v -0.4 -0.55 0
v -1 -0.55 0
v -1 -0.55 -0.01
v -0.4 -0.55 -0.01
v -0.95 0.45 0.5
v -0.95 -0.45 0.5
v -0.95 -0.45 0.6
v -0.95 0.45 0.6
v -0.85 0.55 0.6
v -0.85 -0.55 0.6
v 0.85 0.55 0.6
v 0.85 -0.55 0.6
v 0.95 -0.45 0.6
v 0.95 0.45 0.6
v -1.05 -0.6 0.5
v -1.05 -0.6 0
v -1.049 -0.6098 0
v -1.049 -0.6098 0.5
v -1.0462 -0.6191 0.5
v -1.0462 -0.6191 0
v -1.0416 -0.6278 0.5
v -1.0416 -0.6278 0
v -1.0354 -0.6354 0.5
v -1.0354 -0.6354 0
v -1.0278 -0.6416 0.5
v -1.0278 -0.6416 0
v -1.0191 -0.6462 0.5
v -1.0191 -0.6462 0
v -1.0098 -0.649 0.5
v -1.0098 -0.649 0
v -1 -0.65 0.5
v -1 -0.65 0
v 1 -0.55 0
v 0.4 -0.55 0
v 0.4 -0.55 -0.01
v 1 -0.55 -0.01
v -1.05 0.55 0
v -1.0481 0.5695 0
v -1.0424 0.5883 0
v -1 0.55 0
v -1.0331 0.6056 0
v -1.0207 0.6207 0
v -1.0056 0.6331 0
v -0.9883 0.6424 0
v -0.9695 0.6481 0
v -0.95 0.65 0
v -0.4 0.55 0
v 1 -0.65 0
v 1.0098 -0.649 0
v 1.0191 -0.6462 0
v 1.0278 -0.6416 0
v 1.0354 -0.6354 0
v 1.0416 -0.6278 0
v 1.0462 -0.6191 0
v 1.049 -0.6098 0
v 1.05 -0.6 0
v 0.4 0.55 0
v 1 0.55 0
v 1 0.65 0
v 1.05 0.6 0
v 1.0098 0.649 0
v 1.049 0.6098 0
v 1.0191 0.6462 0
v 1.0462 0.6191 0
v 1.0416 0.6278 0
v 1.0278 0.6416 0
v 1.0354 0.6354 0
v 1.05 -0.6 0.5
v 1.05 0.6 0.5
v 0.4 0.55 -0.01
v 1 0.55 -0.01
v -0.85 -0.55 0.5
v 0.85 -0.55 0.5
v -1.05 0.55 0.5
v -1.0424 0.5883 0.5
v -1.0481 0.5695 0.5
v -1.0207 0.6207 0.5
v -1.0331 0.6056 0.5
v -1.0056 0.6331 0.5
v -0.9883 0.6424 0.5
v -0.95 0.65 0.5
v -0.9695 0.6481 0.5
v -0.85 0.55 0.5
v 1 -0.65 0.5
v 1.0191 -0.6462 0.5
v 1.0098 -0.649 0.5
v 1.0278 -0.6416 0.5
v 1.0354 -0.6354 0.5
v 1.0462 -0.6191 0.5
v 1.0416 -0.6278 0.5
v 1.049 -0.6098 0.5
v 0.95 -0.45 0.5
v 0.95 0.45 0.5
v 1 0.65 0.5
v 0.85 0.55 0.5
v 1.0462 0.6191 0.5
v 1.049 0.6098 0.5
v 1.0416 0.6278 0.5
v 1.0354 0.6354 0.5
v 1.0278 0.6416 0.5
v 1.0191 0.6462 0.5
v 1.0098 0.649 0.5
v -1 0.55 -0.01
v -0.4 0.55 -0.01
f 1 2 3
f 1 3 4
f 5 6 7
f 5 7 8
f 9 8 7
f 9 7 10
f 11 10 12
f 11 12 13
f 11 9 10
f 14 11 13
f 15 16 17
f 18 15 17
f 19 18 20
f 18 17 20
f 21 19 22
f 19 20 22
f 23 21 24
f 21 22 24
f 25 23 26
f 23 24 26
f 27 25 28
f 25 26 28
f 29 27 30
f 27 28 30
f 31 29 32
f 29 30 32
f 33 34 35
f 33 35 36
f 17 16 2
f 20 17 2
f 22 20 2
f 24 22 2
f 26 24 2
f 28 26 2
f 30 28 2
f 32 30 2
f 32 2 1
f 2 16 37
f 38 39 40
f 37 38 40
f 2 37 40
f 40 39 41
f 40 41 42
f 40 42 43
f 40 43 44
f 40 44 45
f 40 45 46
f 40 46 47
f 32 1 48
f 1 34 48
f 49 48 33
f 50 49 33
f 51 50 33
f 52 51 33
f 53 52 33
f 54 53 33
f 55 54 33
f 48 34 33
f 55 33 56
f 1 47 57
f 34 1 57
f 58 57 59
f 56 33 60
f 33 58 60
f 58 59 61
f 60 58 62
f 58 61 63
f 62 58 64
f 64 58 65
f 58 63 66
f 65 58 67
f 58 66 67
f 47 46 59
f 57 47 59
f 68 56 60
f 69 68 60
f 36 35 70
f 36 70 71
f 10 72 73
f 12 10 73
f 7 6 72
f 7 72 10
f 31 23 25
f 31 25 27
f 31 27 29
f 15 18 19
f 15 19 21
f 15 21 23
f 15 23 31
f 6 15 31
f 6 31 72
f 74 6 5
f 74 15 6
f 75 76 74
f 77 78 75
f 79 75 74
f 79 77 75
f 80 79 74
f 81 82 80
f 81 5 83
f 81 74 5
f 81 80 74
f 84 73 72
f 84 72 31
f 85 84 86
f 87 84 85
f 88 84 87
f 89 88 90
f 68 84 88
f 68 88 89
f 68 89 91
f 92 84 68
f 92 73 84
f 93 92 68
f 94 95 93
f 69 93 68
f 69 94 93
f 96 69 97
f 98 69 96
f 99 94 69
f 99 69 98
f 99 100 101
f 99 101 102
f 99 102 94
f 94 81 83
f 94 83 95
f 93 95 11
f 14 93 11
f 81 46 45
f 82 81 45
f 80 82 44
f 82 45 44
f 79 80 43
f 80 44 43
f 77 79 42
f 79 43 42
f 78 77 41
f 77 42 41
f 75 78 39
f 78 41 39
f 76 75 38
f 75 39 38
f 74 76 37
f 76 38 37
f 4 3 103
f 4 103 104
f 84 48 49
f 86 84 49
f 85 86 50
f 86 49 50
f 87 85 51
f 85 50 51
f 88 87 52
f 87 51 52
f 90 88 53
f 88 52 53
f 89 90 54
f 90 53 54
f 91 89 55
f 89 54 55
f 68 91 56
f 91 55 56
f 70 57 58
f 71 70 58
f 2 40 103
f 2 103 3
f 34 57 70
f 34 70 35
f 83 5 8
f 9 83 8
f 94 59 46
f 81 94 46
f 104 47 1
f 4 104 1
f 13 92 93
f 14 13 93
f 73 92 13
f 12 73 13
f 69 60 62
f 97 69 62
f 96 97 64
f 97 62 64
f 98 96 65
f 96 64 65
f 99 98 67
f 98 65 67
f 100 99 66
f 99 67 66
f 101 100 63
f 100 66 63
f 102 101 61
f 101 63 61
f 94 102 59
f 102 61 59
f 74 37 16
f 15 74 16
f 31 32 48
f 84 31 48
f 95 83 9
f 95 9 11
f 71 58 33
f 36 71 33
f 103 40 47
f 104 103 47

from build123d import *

# Parameters (mm, degrees)
F1_DEPTH = 0.5
F2_W     = 1.9
F2_H     = 1.1
F3_DEPTH = 0.1
F4_W     = 0.6
F4_H     = 1.1
F5_DEPTH = 0.01
F6_SIZE  = 0.1


with BuildPart() as f1:
    # F0 (on Top) → F1 (new body)
    with BuildSketch(Plane.XY):
        with BuildLine():
            Line((1, 0.65), (-0.95, 0.65))
            ThreePointArc((-0.95, 0.65), (-1.020711, 0.620711), (-1.05, 0.55))
            Line((-1.05, 0.55), (-1.05, -0.6))
            ThreePointArc((-1.05, -0.6), (-1.035355, -0.635355), (-1, -0.65))
            Line((-1, -0.65), (1, -0.65))
            ThreePointArc((1, -0.65), (1.035355, -0.635355), (1.05, -0.6))
            Line((1.05, -0.6), (1.05, 0.6))
            ThreePointArc((1.05, 0.6), (1.035355, 0.635355), (1, 0.65))
        make_face()
    extrude(amount=F1_DEPTH)

    # F2 (on face) → F3 (join)
    with BuildSketch(Plane.XY.offset(0.5)):
        Rectangle(F2_W, F2_H)
    extrude(amount=F3_DEPTH)

    # F4 (on face) → F5 (join)
    with BuildSketch(Plane(origin=(0, 0, 0), x_dir=(1, 0, 0), z_dir=(0, 0, -1))):
        with Locations((0.7, 0)):
            Rectangle(F4_W, F4_H)
        with Locations((-0.7, 0)):
            Rectangle(F4_W, F4_H)
    extrude(amount=F5_DEPTH)

    # F6
    f6_edges = [f1.edges().sort_by_distance(p)[0] for p in [
        (0.95, -0.55, 0.55),
        (0.95, 0.55, 0.55),
        (-0.95, 0.55, 0.55),
        (-0.95, -0.55, 0.55),
    ]]
    chamfer(f6_edges, length=F6_SIZE)


solid = f1.part
